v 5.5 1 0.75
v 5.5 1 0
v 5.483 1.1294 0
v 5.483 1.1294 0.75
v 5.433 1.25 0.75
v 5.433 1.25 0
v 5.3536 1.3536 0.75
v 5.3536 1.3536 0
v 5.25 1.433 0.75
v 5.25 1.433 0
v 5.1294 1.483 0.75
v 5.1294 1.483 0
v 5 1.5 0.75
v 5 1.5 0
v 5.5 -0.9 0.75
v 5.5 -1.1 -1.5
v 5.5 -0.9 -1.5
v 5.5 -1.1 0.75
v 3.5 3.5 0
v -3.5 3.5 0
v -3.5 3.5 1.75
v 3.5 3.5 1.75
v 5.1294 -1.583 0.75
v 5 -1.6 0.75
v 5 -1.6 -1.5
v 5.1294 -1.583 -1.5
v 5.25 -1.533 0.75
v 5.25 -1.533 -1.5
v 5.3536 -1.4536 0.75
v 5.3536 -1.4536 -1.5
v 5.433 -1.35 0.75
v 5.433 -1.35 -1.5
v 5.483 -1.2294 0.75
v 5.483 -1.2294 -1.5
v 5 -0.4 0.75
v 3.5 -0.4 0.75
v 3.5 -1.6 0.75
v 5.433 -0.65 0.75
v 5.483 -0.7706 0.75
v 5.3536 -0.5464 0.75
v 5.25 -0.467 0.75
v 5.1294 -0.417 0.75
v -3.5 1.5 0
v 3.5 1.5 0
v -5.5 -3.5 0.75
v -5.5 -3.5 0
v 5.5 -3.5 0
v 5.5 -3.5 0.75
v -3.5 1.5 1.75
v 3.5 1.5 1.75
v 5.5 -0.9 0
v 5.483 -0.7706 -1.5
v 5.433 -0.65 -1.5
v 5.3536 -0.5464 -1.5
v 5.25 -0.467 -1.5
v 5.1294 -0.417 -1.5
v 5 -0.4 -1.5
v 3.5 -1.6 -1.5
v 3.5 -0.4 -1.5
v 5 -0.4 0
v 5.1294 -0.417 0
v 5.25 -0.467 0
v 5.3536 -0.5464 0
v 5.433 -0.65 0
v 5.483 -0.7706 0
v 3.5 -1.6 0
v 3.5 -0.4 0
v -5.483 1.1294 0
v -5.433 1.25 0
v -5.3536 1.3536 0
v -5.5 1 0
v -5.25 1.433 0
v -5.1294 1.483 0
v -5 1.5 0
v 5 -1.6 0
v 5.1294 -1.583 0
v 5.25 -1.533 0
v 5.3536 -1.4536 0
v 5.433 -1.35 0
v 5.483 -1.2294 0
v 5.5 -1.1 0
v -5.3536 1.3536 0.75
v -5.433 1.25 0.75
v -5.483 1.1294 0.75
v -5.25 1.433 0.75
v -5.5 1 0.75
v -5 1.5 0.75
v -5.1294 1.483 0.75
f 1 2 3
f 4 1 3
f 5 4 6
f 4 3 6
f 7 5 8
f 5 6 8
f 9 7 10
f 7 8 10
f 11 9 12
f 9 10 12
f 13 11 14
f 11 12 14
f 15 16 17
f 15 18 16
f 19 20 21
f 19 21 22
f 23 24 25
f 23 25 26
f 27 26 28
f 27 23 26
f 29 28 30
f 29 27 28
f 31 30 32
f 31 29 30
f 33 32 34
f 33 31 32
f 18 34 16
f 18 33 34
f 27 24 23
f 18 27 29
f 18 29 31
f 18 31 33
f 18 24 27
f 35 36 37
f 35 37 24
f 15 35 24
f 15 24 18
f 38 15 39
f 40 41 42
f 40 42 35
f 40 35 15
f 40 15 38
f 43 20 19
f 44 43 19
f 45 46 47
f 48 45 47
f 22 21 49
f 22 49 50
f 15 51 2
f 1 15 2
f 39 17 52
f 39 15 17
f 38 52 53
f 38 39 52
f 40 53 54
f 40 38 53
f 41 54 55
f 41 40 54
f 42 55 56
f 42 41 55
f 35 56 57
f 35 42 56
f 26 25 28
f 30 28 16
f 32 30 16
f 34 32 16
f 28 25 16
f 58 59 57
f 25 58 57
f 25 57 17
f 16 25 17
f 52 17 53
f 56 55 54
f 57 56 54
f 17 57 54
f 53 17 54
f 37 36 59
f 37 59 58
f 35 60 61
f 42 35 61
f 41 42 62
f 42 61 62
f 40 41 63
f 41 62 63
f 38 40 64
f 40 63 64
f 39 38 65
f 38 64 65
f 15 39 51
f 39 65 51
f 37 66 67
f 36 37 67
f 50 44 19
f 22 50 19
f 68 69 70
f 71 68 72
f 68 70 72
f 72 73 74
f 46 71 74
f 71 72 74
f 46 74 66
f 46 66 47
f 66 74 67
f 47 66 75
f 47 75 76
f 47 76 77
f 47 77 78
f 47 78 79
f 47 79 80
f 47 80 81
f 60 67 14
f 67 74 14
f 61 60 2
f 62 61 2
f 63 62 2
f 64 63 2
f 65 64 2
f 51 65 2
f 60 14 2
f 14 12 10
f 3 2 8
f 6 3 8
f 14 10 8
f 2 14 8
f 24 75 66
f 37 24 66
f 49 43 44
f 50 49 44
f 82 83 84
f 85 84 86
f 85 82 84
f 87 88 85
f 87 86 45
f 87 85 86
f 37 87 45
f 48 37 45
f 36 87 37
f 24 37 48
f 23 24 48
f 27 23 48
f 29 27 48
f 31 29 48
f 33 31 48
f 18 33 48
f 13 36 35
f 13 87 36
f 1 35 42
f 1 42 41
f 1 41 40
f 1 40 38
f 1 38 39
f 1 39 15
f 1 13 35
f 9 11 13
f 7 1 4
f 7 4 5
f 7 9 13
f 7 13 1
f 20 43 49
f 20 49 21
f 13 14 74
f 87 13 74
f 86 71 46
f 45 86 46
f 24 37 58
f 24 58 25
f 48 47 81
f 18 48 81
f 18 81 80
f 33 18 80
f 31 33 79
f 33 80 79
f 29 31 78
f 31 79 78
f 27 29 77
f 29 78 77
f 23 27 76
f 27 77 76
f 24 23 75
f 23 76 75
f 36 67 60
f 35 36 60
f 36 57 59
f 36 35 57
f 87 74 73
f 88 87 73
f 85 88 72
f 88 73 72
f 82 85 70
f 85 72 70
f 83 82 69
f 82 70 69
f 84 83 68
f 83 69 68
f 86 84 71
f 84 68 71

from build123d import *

# Parameters (mm, degrees)
F1_DEPTH      = 0.75
F2_DEPTH      = 0.75
F2_DEPTH_BACK = 1.5
F0_W          = 7
F0_H          = 2
F3_DEPTH      = 1.75


with BuildPart() as f1:
    # F0 (on Top) → F1 (new body)
    with BuildSketch(Plane.XY):
        with BuildLine():
            Line((-3.5, -3.5), (-3.5, 1.5))
            Line((-3.5, 1.5), (-5, 1.5))
            ThreePointArc((-5, 1.5), (-5.353553, 1.353553), (-5.5, 1))
            Line((-5.5, 1), (-5.5, -3.5))
            Line((-5.5, -3.5), (-3.5, -3.5))
        make_face()
        with BuildLine():
            Line((5, -1.6), (3.5, -1.6))
            Line((3.5, -1.6), (3.5, -3.5))
            Line((3.5, -3.5), (5.5, -3.5))
            Line((5.5, -3.5), (5.5, -1.1))
            ThreePointArc((5.5, -1.1), (5.353553, -1.453553), (5, -1.6))
        make_face()
        with BuildLine():
            Line((5, 1.5), (3.5, 1.5))
            Line((3.5, 1.5), (3.5, -0.4))
            Line((3.5, -0.4), (5, -0.4))
            ThreePointArc((5, -0.4), (5.353553, -0.546447), (5.5, -0.9))
            Line((5.5, -0.9), (5.5, 1))
            ThreePointArc((5.5, 1), (5.353553, 1.353553), (5, 1.5))
        make_face()
        Polygon((3.5, -0.4), (3.5, 1.5), (-3.5, 1.5), (-3.5, -3.5), (3.5, -3.5), (3.5, -1.6), align=None)
    extrude(amount=F1_DEPTH)


with BuildPart() as f2:
    # F0 (on Top) → F2 (new body, two sides)
    with BuildSketch(Plane.XY) as f2_sk:
        with BuildLine():
            Line((5, -0.4), (3.5, -0.4))
            Line((3.5, -0.4), (3.5, -1.6))
            Line((3.5, -1.6), (5, -1.6))
            ThreePointArc((5, -1.6), (5.353553, -1.453553), (5.5, -1.1))
            Line((5.5, -1.1), (5.5, -0.9))
            ThreePointArc((5.5, -0.9), (5.353553, -0.546447), (5, -0.4))
        make_face()
    extrude(amount=F2_DEPTH)
    extrude(f2_sk.sketch, amount=-F2_DEPTH_BACK)


with BuildPart() as f3:
    # F0 (on Top) → F3 (new body)
    with BuildSketch(Plane.XY):
        with Locations((0, 2.5)):
            Rectangle(F0_W, F0_H)
    extrude(amount=F3_DEPTH)


solid = Compound([f1.part, f2.part, f3.part])
